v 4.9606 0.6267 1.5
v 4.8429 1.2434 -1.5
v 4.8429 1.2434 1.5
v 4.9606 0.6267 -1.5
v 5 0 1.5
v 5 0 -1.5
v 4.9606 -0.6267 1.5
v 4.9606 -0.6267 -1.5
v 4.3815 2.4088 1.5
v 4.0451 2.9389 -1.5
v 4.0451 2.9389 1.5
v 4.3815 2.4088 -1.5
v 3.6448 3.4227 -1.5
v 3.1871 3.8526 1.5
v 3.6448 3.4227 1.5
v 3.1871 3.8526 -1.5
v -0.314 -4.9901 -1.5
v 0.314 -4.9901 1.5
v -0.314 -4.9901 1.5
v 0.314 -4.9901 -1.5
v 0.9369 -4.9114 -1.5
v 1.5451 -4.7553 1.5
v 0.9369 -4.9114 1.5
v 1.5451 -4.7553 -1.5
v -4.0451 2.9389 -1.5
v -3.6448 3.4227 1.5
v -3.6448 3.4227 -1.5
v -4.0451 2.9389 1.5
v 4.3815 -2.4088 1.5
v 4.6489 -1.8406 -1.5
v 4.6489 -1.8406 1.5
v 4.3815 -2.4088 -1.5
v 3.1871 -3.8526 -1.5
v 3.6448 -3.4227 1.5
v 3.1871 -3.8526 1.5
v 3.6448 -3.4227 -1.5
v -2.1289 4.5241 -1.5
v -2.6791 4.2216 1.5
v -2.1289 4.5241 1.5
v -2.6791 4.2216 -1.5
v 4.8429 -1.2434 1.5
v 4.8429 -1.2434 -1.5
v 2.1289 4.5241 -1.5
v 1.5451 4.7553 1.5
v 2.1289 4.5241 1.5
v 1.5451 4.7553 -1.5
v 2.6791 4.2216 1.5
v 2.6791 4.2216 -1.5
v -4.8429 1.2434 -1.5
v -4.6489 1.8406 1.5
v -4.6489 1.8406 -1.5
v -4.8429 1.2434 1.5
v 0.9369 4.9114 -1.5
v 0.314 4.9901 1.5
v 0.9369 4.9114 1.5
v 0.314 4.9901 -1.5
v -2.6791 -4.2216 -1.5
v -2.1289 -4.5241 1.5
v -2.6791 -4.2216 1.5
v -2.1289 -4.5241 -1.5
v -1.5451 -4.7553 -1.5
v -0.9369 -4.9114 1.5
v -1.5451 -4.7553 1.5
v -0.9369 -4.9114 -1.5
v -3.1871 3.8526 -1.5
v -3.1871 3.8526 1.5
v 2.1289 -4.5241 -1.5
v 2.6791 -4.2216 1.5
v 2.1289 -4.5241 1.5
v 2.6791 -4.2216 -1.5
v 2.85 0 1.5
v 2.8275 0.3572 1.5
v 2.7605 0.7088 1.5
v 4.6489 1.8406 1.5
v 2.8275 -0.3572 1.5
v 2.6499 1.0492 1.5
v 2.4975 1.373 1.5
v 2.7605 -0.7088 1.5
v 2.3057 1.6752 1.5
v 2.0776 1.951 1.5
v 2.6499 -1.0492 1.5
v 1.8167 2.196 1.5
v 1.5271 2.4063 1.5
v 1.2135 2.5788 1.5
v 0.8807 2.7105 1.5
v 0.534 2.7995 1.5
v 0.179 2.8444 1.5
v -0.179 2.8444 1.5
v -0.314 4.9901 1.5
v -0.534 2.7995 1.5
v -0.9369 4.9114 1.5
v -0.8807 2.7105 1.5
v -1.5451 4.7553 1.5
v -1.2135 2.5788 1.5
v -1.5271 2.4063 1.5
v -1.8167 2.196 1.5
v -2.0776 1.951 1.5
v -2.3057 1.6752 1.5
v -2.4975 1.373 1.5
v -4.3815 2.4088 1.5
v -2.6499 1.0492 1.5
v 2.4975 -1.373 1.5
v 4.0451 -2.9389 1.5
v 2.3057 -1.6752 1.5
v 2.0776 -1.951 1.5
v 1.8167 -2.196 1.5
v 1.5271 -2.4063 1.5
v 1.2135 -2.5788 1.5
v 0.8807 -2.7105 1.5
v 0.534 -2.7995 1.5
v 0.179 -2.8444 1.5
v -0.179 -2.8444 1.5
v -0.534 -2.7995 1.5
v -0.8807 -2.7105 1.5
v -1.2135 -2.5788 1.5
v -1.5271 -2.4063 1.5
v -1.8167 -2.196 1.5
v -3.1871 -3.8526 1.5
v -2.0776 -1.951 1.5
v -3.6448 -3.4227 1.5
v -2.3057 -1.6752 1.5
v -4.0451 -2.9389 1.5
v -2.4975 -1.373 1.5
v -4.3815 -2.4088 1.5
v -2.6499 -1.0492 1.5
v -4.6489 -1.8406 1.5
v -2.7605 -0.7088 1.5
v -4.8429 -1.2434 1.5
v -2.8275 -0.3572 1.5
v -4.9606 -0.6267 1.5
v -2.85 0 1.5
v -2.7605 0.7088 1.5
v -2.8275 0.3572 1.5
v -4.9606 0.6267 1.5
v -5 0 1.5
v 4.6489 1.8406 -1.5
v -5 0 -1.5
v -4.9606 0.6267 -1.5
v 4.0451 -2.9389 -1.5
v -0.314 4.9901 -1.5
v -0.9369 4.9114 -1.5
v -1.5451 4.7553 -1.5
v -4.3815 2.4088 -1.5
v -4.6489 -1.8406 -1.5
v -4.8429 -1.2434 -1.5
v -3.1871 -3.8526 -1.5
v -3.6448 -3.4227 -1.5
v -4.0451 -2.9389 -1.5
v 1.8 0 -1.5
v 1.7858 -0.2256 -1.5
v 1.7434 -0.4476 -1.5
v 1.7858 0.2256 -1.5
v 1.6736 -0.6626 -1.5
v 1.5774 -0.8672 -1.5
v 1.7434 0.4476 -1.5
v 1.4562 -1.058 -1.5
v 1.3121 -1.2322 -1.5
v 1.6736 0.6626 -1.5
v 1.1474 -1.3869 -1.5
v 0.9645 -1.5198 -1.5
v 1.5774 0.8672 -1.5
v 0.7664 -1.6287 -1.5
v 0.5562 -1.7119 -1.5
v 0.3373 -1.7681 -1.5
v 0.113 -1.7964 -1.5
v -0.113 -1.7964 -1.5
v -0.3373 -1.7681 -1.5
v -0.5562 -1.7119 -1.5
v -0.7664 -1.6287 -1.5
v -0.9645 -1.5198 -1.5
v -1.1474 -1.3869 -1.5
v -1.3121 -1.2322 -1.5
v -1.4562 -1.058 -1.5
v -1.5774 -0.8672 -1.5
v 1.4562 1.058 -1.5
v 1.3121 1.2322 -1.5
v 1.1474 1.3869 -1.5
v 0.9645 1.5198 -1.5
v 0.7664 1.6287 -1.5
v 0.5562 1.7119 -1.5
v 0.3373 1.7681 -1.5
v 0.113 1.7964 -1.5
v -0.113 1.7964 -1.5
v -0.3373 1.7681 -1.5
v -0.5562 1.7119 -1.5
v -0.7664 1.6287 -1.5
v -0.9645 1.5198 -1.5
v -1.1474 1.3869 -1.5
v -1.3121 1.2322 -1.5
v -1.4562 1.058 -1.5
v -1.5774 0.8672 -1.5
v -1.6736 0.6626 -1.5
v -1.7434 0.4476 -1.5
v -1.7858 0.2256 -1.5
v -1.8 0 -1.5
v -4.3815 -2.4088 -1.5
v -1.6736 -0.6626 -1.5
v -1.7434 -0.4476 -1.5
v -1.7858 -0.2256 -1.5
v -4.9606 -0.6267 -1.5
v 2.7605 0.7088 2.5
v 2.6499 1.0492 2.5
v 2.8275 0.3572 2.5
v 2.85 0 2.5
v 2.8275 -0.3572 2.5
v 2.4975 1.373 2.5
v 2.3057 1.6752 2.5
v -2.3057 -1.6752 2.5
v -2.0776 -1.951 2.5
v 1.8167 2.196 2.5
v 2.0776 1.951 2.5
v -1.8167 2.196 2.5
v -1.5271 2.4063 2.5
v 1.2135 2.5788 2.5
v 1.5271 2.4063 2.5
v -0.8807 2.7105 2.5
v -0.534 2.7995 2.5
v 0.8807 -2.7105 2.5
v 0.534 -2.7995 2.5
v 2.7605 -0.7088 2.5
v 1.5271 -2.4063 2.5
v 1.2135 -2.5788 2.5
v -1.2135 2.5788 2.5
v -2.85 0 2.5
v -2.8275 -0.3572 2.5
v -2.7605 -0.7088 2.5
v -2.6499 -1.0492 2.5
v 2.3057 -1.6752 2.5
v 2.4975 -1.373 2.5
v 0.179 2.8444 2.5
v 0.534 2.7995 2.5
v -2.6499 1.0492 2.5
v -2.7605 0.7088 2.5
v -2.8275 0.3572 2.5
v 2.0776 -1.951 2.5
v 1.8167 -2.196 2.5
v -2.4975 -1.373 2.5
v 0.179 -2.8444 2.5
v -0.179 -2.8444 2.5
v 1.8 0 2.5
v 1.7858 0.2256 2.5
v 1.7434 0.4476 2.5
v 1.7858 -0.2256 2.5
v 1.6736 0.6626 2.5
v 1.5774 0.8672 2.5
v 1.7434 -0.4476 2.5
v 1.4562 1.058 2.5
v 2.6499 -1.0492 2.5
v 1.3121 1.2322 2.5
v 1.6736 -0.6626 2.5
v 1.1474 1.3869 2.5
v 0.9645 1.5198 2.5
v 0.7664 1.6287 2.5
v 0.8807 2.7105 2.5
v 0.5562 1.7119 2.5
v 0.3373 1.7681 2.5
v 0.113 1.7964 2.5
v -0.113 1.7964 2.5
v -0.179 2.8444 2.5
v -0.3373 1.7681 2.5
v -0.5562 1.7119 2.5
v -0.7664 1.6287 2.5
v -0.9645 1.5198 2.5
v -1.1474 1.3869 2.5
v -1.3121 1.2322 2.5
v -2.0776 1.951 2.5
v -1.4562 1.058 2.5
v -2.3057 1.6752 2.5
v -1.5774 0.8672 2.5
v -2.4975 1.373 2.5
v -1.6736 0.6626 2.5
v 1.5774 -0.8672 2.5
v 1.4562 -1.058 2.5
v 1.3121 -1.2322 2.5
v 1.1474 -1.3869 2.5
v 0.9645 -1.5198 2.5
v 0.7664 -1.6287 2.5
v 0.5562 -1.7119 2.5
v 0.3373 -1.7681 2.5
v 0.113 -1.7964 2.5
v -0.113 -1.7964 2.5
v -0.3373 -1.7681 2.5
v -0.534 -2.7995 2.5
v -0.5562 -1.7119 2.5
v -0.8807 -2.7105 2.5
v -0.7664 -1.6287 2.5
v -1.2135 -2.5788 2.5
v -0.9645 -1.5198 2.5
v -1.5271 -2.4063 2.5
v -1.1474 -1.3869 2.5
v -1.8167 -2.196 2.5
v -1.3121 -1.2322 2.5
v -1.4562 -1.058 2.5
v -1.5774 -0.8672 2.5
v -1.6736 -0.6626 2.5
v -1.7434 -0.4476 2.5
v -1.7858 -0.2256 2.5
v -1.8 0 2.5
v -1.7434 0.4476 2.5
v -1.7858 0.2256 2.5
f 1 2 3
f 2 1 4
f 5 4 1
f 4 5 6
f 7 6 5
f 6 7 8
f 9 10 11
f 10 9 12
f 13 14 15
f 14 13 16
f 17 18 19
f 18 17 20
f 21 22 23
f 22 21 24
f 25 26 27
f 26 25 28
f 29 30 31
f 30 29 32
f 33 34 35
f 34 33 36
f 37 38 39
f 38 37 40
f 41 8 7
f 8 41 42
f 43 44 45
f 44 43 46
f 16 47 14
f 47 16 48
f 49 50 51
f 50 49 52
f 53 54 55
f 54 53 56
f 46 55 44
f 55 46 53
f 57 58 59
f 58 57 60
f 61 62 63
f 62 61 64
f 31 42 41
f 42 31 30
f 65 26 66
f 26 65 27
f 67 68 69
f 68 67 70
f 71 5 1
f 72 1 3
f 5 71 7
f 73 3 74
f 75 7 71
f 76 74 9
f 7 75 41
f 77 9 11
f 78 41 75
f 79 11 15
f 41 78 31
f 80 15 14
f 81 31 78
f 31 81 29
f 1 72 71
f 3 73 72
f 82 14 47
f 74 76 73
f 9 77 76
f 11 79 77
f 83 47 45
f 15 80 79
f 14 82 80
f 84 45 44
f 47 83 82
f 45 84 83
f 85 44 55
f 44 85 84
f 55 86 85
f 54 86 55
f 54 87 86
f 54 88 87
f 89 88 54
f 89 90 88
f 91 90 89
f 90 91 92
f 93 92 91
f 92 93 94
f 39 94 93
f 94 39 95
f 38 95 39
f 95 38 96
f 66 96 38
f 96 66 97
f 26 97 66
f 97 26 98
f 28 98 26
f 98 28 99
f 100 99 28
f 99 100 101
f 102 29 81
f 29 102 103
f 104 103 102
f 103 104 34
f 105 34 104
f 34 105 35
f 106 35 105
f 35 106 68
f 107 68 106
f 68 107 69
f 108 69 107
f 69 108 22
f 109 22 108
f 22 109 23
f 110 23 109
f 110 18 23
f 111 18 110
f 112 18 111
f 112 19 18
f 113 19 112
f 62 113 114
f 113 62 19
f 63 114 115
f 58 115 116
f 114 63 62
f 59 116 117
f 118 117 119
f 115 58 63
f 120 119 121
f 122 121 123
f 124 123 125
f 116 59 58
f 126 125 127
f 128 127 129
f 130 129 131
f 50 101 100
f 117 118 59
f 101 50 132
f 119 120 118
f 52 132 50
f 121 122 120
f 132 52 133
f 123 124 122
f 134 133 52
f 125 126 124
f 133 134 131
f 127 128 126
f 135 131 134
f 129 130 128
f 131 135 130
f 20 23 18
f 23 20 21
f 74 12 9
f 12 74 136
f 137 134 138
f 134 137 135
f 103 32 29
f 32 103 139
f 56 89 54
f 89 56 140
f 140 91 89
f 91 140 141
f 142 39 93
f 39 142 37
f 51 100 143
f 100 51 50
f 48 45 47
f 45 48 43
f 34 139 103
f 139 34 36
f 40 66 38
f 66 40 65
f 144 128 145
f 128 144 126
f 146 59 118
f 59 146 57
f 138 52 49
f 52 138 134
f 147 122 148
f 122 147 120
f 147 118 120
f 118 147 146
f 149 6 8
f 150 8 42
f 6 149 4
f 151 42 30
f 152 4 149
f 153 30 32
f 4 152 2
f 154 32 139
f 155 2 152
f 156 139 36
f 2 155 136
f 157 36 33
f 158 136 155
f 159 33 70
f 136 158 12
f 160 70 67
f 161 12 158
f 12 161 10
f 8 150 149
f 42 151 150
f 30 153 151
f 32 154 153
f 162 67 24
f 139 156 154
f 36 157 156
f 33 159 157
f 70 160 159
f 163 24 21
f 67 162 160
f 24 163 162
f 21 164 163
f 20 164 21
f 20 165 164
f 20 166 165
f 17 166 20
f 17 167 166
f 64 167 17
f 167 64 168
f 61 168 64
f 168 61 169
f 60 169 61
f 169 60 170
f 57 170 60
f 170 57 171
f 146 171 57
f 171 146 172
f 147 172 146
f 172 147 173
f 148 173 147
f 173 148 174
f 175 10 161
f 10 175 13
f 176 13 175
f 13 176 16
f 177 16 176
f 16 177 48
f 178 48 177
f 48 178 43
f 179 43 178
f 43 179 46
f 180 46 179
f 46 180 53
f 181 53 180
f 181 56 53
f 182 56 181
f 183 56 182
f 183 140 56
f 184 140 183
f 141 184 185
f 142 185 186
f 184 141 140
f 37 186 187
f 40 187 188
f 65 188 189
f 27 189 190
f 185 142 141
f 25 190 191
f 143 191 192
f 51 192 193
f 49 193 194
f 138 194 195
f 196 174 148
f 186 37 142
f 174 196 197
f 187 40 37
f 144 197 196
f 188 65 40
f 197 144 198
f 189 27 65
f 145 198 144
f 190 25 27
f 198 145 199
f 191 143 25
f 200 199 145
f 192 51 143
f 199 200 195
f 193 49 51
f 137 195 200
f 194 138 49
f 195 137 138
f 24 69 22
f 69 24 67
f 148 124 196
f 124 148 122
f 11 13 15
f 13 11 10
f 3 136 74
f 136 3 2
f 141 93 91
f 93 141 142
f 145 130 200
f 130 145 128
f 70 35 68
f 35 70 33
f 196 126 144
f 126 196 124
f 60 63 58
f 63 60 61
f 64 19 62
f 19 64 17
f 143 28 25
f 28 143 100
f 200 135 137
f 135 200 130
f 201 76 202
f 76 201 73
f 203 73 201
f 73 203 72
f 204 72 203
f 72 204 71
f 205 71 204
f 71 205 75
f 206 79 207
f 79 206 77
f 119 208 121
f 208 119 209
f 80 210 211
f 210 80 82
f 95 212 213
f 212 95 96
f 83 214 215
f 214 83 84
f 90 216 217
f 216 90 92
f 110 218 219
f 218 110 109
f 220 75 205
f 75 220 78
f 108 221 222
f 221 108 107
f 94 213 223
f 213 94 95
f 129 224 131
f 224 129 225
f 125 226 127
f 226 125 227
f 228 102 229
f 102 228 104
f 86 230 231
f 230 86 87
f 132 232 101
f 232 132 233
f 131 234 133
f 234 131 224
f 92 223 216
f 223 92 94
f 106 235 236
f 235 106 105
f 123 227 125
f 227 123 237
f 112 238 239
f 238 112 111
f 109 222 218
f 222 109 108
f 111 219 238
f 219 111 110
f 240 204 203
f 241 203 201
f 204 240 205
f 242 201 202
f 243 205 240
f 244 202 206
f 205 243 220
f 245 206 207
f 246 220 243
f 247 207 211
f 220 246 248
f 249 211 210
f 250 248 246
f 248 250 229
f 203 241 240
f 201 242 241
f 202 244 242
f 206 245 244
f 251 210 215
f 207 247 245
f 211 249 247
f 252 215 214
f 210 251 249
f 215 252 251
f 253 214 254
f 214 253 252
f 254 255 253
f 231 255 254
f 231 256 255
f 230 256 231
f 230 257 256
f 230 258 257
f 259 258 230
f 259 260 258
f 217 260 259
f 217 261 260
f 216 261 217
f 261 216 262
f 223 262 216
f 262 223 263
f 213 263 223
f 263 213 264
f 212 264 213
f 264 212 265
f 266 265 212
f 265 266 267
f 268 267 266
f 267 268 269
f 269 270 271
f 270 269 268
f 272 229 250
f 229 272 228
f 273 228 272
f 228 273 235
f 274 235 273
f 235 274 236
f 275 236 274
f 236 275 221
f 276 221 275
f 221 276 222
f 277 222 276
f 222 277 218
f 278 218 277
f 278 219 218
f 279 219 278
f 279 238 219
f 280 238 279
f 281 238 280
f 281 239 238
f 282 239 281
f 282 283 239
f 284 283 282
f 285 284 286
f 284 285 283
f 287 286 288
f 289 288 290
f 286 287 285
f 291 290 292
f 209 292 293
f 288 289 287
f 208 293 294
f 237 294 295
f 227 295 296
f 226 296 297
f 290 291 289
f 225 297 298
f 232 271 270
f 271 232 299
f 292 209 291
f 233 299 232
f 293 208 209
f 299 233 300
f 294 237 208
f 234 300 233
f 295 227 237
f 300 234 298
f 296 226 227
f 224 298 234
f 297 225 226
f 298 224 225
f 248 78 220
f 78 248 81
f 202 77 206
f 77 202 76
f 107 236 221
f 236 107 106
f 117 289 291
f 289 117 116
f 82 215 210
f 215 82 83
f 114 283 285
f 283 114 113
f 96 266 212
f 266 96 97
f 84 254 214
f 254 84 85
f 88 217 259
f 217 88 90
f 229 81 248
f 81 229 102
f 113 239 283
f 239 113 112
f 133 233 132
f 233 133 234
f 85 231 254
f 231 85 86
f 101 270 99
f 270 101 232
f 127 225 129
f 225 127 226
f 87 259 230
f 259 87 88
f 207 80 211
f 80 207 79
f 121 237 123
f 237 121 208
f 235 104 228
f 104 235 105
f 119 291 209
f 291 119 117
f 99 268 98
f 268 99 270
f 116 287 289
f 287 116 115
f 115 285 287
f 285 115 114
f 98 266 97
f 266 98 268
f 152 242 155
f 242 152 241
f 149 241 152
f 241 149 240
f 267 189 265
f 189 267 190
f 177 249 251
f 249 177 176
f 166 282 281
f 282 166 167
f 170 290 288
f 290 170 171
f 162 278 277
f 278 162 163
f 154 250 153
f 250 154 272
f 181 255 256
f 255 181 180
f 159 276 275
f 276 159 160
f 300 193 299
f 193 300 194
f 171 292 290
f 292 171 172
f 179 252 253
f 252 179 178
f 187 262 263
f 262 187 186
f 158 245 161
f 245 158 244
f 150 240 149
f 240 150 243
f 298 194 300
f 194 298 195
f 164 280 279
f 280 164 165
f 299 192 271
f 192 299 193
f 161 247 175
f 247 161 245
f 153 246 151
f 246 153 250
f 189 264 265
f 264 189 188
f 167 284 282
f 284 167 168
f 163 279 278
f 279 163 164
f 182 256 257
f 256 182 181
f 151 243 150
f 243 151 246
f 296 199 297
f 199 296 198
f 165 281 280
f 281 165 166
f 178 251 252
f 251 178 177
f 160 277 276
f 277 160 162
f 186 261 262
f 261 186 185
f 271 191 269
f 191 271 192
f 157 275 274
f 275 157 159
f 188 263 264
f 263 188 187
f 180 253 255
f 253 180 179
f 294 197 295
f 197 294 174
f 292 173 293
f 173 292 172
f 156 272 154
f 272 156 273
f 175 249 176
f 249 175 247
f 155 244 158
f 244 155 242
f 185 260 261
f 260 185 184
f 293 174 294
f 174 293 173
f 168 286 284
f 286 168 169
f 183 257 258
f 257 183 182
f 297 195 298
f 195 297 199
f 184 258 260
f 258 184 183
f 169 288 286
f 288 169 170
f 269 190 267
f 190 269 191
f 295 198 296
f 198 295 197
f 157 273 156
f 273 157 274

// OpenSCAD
$fn = 50;


difference() {
	union() {
		translate(v = [0, 0, -1.5000000000]) {
			cylinder(h = 3, r = 5.0000000000);
		}
		translate(v = [0, 0, -1.5000000000]) {
			cylinder(h = 4, r = 2.8500000000);
		}
	}
	union() {
		translate(v = [0, 0, -100.0000000000]) {
			cylinder(h = 200, r = 1.8000000000);
		}
	}
}
